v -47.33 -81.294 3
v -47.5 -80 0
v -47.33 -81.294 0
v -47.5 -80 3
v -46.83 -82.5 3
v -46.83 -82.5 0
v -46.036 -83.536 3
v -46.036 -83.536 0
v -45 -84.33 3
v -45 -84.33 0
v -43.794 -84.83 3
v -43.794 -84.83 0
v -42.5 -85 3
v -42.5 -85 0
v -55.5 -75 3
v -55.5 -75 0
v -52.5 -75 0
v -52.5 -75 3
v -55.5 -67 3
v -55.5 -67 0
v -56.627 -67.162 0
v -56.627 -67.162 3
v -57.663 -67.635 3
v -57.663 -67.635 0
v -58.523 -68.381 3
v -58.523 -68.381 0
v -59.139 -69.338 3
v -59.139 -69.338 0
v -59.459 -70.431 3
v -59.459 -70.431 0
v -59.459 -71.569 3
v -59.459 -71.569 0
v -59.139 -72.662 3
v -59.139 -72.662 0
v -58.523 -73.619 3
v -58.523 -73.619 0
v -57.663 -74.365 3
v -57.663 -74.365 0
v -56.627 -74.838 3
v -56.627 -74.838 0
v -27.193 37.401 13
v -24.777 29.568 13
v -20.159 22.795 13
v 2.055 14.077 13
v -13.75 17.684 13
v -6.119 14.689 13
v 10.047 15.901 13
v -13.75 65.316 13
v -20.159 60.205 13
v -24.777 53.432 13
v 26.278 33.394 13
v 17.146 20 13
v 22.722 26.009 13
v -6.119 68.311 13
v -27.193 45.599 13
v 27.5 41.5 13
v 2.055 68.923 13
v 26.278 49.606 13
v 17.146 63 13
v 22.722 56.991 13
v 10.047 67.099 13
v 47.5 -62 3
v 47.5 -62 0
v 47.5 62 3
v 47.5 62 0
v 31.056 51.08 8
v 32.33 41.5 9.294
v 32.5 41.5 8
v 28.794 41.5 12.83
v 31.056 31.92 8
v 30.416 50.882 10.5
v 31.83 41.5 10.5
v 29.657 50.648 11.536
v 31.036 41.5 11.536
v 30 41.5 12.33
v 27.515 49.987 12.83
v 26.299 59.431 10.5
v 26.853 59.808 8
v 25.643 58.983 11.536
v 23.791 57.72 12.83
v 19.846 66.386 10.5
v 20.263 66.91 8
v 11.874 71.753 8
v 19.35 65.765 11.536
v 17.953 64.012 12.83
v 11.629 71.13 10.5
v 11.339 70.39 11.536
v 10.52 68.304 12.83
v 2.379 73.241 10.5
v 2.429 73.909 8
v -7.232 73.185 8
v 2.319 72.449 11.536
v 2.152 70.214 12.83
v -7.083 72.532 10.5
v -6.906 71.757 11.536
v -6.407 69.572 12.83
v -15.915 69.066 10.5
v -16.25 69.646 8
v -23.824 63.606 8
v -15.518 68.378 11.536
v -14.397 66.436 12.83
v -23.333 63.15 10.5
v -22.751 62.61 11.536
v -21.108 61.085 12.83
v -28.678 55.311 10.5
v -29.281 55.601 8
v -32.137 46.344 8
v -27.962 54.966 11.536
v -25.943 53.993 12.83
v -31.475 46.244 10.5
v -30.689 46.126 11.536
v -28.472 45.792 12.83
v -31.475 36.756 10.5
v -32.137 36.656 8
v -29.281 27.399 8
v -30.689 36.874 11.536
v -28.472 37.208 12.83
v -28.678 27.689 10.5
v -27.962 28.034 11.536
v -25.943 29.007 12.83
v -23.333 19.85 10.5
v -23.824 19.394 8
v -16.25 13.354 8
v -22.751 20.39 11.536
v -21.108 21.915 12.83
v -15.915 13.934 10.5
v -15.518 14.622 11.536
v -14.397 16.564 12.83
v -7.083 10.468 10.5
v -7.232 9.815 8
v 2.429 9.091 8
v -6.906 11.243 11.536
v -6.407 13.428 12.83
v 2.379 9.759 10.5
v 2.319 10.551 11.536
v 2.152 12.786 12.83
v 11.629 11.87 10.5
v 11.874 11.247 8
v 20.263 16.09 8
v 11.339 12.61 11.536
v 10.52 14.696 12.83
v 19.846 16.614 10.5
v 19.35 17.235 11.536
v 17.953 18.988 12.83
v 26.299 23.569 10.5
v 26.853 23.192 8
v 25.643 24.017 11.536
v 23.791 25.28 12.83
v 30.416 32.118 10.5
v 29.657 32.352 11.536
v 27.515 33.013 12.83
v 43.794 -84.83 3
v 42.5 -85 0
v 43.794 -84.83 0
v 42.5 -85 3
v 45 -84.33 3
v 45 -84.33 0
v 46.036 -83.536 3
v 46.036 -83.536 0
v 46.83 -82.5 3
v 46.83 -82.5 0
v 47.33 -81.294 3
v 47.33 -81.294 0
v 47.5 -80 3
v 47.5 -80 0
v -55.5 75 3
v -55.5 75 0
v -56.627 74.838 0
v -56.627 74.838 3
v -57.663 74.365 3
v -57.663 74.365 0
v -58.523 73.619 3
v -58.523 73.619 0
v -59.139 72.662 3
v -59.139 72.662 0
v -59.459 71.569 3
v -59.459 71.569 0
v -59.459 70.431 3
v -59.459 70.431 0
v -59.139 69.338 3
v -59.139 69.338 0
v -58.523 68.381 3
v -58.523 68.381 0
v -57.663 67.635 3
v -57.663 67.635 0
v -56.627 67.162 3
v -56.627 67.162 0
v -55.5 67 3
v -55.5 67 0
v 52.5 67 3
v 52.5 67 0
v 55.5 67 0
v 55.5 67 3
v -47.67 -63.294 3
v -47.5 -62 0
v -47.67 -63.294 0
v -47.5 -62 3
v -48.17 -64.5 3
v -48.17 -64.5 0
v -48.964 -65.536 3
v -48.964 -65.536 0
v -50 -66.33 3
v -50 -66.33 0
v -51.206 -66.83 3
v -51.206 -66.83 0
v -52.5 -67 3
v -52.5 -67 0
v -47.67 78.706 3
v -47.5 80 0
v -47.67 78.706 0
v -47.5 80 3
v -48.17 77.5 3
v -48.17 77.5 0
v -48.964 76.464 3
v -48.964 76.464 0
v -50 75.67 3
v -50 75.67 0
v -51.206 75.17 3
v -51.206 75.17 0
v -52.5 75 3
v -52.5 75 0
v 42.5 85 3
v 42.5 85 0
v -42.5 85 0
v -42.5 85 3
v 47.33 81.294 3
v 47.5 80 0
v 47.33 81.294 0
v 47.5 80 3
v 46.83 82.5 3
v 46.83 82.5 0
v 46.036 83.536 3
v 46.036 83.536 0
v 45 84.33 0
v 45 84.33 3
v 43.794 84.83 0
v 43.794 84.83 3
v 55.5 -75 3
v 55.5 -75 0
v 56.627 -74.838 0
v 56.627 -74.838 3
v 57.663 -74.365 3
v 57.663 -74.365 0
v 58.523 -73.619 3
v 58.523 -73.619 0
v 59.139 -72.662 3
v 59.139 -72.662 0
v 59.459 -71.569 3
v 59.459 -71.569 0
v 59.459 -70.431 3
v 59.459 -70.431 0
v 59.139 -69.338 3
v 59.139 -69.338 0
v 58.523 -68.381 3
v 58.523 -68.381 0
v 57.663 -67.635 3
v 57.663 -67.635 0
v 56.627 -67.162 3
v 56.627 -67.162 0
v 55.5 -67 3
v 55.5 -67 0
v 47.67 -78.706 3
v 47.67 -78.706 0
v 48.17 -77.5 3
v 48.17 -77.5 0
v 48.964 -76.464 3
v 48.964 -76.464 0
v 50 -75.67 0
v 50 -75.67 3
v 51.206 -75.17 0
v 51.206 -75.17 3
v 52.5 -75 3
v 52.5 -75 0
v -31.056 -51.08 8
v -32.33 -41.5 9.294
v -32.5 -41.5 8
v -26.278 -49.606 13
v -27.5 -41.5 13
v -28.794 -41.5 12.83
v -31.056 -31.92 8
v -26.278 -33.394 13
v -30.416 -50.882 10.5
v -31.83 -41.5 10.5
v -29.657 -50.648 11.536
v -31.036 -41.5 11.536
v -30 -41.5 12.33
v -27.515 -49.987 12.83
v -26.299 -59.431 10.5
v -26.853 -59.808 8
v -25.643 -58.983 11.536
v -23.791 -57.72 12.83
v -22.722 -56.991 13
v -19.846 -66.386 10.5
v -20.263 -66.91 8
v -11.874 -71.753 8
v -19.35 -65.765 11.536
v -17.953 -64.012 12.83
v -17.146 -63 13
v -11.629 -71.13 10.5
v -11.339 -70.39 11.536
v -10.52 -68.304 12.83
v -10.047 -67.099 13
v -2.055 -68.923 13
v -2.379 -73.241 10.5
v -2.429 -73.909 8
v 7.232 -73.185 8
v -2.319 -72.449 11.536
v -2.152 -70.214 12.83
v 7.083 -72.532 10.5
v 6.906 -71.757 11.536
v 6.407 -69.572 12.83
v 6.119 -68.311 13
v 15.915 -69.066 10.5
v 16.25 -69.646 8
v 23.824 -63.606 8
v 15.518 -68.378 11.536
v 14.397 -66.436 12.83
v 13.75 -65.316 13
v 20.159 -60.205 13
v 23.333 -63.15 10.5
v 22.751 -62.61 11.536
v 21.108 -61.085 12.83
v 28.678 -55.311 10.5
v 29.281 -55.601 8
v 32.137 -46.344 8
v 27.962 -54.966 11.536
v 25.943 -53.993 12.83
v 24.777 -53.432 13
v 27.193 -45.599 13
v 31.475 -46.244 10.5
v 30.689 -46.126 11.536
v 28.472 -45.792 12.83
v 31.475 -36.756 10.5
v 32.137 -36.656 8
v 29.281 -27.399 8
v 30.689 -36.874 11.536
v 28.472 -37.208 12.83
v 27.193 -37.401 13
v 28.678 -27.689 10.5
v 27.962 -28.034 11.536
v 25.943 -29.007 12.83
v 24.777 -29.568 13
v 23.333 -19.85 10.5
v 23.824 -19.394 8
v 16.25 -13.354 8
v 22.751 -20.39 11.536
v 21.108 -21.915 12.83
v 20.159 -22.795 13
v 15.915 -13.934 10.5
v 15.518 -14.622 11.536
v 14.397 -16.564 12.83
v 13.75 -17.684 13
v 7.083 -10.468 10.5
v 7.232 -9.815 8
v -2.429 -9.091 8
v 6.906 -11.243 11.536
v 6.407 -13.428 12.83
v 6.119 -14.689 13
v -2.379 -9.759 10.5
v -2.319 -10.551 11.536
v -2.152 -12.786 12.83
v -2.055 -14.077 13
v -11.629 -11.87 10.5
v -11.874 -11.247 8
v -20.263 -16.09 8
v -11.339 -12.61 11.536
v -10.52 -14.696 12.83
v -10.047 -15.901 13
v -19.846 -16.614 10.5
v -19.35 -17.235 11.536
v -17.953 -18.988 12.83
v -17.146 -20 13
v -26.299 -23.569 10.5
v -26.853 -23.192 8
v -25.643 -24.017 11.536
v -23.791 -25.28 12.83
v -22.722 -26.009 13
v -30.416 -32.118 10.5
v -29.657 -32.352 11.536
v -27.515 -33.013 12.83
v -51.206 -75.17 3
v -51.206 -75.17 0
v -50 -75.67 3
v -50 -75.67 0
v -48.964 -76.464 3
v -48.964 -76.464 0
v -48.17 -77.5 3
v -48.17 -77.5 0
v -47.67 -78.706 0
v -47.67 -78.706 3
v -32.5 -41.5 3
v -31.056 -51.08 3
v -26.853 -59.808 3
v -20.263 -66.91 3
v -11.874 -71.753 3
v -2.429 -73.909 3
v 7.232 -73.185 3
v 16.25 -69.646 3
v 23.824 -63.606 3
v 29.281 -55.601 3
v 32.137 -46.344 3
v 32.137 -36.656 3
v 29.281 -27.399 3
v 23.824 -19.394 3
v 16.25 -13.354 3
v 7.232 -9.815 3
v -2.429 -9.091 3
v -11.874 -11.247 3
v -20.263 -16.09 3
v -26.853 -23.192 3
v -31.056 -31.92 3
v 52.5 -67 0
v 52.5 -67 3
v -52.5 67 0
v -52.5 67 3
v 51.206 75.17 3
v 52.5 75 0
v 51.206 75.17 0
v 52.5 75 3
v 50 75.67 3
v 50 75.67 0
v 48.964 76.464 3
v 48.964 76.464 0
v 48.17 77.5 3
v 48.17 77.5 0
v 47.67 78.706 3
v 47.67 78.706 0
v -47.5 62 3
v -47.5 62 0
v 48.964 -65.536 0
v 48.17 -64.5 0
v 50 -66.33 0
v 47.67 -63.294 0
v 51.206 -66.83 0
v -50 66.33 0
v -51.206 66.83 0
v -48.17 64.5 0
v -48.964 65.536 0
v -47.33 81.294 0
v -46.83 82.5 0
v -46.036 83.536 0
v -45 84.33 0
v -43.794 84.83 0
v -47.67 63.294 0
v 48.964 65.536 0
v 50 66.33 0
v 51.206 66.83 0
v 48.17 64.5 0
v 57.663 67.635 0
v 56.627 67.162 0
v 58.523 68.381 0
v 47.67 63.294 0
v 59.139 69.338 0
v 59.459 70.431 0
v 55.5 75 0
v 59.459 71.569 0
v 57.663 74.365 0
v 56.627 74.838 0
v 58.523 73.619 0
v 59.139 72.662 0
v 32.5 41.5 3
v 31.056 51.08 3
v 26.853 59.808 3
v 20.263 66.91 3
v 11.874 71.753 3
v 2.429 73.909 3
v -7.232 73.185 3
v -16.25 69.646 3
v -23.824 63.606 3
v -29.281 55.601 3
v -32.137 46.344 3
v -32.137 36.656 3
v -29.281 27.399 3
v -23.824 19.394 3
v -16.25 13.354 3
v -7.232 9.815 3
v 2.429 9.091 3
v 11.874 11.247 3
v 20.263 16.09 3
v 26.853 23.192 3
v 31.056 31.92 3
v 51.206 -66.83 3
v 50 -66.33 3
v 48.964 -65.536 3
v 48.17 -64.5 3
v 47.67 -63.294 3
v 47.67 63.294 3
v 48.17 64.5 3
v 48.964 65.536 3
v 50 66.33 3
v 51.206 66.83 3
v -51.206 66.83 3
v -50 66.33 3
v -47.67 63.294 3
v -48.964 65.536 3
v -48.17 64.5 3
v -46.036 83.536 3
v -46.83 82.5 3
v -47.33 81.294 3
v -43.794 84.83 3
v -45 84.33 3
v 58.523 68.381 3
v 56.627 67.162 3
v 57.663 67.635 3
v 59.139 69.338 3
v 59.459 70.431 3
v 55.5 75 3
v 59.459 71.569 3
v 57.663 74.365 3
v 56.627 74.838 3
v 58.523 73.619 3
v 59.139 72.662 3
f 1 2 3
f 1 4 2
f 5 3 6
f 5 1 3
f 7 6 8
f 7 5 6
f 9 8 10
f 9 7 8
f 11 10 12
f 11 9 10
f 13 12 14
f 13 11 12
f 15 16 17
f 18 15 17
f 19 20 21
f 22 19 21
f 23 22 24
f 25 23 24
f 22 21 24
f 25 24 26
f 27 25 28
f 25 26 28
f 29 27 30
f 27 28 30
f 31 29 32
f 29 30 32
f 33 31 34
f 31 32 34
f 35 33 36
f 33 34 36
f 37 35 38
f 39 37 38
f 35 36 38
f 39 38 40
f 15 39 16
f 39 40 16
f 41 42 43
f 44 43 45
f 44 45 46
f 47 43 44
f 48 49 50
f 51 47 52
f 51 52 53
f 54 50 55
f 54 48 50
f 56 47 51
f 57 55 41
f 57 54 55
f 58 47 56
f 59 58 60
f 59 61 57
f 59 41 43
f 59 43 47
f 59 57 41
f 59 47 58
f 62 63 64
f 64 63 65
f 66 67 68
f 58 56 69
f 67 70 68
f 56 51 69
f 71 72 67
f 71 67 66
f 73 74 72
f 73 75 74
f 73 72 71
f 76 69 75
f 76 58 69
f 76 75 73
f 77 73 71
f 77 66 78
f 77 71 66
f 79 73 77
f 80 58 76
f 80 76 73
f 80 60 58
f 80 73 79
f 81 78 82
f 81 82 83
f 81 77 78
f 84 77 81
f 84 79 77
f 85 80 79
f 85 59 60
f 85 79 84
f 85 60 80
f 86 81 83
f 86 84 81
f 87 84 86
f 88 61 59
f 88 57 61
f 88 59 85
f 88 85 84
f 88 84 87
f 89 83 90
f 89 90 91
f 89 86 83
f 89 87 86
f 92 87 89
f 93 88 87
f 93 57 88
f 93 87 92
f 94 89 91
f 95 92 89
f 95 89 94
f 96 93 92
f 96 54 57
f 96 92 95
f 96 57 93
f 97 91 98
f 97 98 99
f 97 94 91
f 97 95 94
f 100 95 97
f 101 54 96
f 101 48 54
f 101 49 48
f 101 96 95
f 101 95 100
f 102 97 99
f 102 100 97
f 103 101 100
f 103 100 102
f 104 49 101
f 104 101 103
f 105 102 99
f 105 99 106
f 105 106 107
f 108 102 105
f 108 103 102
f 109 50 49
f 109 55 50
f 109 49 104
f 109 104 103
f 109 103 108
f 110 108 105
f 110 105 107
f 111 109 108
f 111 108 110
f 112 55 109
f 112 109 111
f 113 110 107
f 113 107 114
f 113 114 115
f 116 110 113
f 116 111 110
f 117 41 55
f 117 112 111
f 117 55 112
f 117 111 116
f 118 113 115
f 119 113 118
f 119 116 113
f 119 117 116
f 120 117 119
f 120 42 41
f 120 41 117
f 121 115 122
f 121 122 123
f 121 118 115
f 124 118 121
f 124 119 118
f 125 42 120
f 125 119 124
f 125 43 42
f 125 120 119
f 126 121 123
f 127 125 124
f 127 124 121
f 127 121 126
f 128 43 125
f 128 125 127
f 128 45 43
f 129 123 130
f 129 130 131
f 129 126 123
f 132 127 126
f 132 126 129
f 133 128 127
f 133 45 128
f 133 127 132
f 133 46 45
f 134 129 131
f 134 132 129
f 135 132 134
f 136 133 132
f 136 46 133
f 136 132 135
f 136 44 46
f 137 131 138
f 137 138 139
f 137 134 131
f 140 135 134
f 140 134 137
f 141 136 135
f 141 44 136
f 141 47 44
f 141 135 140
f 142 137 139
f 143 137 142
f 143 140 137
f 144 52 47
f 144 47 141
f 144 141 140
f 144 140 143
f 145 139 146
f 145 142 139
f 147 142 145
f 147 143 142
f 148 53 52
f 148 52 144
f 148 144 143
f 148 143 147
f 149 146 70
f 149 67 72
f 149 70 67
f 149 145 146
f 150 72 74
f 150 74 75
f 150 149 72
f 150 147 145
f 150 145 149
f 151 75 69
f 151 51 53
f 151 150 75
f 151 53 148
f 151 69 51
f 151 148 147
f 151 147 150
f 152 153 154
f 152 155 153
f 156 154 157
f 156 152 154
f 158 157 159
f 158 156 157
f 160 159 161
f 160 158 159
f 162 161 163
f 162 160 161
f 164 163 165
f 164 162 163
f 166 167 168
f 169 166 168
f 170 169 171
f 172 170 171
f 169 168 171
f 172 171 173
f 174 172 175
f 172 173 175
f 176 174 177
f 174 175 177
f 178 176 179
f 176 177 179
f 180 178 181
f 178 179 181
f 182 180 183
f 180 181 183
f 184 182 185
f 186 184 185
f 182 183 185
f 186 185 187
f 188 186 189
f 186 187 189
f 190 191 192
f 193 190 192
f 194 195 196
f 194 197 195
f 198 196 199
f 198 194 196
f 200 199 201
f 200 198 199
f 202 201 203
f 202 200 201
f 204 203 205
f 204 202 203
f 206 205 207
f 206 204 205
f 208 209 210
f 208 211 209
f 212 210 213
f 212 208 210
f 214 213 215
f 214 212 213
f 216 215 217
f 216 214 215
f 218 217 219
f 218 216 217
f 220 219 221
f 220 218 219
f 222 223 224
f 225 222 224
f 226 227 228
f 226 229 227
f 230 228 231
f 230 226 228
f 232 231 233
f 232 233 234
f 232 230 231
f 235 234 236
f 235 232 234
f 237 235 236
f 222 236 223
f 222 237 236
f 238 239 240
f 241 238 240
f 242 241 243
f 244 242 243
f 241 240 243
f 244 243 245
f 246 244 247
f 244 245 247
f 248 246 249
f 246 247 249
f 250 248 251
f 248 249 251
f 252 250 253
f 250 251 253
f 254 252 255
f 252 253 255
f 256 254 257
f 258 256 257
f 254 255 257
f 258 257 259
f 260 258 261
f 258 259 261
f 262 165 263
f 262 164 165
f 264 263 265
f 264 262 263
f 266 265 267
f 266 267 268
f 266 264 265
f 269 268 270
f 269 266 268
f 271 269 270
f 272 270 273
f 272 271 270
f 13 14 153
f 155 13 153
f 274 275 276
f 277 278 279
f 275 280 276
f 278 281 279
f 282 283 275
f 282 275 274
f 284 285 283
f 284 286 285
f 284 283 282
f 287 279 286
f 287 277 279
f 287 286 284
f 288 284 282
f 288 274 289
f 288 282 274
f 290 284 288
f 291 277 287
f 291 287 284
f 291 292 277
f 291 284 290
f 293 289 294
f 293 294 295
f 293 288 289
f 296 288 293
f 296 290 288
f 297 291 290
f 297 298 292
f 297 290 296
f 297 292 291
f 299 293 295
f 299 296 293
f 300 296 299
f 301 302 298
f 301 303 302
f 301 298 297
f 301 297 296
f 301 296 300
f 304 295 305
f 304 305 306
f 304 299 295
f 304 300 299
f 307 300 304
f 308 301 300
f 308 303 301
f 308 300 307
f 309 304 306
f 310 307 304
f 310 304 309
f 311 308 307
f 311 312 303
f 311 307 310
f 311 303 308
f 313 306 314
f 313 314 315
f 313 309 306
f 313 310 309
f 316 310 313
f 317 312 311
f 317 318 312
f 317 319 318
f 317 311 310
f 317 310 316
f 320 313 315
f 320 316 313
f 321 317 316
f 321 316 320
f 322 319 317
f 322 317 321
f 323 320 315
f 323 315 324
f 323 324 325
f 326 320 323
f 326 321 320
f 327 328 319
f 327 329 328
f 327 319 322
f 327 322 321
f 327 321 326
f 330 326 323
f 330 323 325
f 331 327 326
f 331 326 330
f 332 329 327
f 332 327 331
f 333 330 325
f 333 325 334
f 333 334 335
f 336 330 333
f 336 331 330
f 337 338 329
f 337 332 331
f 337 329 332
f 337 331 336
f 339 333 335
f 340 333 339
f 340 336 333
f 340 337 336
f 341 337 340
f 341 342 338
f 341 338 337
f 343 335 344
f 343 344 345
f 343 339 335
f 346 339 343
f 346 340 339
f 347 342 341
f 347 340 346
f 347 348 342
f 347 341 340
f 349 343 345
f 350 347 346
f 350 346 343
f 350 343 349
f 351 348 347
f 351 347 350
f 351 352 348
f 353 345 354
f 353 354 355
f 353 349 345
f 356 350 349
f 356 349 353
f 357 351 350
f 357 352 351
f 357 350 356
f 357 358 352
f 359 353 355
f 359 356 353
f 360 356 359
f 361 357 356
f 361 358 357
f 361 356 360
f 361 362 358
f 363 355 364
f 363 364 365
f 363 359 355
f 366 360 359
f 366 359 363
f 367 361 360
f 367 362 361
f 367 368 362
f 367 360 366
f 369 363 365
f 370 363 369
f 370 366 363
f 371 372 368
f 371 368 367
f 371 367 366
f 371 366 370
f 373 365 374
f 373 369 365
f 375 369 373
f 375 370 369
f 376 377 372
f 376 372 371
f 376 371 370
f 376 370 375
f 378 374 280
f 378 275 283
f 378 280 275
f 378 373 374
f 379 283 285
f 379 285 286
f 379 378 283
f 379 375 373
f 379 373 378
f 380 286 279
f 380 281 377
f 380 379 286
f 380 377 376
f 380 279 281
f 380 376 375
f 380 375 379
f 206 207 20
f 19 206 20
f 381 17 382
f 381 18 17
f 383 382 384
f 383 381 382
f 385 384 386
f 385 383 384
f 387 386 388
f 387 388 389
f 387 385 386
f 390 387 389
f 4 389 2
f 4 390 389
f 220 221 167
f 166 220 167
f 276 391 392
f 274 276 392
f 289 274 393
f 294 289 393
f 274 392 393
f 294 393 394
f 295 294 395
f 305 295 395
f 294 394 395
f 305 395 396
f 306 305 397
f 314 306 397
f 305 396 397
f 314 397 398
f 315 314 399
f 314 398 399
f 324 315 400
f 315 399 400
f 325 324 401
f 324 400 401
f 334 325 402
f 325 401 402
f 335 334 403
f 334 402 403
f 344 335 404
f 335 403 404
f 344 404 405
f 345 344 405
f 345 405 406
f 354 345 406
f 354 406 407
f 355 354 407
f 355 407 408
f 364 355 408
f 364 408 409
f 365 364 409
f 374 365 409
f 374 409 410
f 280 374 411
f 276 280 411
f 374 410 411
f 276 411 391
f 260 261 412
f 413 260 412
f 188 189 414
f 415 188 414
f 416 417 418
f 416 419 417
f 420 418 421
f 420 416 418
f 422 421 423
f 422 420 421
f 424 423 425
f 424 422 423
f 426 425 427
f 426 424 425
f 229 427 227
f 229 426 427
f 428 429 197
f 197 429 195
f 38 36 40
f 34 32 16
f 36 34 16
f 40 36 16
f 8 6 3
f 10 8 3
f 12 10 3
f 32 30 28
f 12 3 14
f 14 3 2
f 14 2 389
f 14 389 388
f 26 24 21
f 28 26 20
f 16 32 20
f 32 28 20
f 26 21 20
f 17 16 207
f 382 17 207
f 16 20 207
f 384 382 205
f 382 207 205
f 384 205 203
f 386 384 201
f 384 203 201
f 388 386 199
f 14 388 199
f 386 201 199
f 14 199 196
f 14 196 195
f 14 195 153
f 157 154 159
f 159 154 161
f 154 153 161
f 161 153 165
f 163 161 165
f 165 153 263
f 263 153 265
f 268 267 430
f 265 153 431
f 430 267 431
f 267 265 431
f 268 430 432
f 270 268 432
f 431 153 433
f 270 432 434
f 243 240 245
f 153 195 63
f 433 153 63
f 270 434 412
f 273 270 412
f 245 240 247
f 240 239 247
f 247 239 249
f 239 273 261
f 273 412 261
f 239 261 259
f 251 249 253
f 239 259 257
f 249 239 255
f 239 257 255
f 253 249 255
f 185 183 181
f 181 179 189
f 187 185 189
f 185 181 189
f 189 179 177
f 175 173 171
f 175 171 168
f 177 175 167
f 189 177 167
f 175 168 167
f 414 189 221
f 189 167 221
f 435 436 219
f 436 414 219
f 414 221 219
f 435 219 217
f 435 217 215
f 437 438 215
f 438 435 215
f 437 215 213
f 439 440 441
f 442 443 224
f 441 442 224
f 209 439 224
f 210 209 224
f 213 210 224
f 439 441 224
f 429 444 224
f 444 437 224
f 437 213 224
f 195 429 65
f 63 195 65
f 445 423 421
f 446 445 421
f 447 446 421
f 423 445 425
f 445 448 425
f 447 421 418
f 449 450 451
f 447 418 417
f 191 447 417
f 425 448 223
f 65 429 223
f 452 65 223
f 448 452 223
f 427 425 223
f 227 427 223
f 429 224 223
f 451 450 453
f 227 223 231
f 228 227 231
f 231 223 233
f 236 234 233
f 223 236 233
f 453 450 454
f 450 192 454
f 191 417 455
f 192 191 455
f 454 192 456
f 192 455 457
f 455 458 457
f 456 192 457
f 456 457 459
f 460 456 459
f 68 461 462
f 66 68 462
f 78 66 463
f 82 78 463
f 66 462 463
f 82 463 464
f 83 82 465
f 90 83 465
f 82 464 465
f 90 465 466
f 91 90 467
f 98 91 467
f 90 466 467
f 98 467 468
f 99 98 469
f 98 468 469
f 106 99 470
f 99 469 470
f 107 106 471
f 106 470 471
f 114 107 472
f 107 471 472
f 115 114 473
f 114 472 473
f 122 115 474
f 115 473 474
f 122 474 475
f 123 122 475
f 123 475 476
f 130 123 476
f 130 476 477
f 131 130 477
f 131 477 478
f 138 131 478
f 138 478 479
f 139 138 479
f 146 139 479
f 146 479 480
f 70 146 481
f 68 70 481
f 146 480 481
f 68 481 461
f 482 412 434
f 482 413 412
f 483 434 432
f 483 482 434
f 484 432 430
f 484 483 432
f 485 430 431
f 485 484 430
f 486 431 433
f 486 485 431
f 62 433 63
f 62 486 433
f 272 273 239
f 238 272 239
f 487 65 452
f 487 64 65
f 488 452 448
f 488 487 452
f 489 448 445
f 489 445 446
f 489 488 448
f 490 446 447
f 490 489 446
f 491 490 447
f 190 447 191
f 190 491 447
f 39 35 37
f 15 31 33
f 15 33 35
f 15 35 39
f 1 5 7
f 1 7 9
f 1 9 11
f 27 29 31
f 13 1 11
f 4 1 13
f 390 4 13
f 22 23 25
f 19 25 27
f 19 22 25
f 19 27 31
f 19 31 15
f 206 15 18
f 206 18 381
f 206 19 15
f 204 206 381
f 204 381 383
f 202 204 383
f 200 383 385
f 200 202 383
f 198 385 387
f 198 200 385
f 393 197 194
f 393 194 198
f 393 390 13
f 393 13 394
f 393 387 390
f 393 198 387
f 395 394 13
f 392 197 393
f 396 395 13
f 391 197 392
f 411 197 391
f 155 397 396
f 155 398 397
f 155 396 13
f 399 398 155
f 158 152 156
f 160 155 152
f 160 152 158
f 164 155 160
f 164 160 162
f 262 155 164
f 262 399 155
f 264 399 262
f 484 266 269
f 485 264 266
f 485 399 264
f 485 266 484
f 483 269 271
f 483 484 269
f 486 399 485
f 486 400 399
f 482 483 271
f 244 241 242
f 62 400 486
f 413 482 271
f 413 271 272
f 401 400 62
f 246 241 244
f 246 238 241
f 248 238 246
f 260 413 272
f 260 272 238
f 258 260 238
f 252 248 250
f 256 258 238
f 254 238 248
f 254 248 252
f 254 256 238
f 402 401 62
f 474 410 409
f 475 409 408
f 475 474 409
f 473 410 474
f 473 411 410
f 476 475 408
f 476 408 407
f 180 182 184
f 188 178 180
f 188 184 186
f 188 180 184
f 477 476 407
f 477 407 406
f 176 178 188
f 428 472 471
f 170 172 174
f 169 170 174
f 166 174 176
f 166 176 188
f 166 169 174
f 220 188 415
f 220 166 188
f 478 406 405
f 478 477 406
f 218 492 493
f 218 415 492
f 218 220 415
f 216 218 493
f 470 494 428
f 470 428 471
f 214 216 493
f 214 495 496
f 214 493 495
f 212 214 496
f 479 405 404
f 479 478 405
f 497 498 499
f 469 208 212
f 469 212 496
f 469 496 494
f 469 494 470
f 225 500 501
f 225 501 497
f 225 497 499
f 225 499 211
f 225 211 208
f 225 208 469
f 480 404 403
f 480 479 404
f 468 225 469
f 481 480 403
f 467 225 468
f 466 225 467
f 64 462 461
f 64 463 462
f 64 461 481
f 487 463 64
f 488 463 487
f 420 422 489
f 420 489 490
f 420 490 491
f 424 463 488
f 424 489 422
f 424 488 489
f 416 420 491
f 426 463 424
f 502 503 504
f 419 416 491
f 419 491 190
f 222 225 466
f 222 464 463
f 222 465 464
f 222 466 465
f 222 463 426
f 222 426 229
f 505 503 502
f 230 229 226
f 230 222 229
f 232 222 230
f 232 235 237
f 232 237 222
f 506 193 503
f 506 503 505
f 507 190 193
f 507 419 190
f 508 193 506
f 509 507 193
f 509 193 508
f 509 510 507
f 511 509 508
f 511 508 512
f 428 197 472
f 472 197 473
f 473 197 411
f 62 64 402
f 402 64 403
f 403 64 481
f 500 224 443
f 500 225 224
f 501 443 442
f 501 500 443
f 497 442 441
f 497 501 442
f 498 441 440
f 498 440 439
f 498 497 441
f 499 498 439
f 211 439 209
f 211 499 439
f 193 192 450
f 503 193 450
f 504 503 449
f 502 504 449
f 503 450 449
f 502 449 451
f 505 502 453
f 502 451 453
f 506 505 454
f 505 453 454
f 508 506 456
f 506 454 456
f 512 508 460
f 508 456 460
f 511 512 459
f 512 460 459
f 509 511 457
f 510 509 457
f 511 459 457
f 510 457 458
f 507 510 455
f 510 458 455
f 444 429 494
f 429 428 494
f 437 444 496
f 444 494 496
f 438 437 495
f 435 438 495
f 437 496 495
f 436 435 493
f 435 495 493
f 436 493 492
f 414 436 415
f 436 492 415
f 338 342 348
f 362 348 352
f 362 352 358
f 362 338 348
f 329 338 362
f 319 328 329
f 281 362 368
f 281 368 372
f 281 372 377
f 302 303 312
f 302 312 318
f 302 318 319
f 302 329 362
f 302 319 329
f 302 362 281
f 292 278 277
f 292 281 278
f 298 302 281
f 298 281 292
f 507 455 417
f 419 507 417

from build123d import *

# Parameters (mm, degrees)
EXTRUDE_1_DEPTH = 3
FILLET_1_R      = 5
SKETCH_2_R      = 32.5
EXTRUDE_2_DEPTH = 10
FILLET_2_R      = 5


with BuildPart() as part:
    # 草圖1 → 填料-伸長1 (new body)
    with BuildSketch(Plane.XY):
        with BuildLine():
            Line((-47.5, 67), (-47.5, -67))
            Line((-47.5, -67), (-55.5, -67))
            ThreePointArc((-55.5, -67), (-59.5, -71), (-55.5, -75))
            Line((-55.5, -75), (-47.5, -75))
            Line((-47.5, -75), (-47.5, -85))
            Line((-47.5, -85), (47.5, -85))
            Line((47.5, -85), (47.5, -75))
            Line((47.5, -75), (55.5, -75))
            ThreePointArc((55.5, -75), (59.5, -71), (55.5, -67))
            Line((55.5, -67), (47.5, -67))
            Line((47.5, -67), (47.5, 67))
            Line((47.5, 67), (55.5, 67))
            ThreePointArc((55.5, 67), (59.5, 71), (55.5, 75))
            Line((55.5, 75), (47.5, 75))
            Line((47.5, 75), (47.5, 85))
            Line((47.5, 85), (-47.5, 85))
            Line((-47.5, 85), (-47.5, 75))
            Line((-47.5, 75), (-55.5, 75))
            ThreePointArc((-55.5, 75), (-59.5, 71), (-55.5, 67))
            Line((-55.5, 67), (-47.5, 67))
        make_face()
    extrude(amount=EXTRUDE_1_DEPTH)

    # 圓角1
    fillet_1_edges = [part.edges().sort_by_distance(p)[0] for p in [
        (-47.5, 85, 1.5),
        (47.5, 85, 1.5),
        (47.5, 75, 1.5),
        (47.5, 67, 1.5),
        (47.5, -67, 1.5),
        (47.5, -75, 1.5),
        (47.5, -85, 1.5),
        (-47.5, -85, 1.5),
        (-47.5, -75, 1.5),
        (-47.5, -67, 1.5),
        (-47.5, 67, 1.5),
        (-47.5, 75, 1.5),
    ]]
    fillet(fillet_1_edges, radius=FILLET_1_R - 0.0001)  # a hair under: the kernel refuses the full size

    # 草圖2 → 填料-伸長2 (add)
    with BuildSketch(Plane.XY.offset(3)):
        with Locations((0, 41.5)):
            Circle(SKETCH_2_R)
        with Locations(Location((0, -41.5, 0), (0, 0, 180))):
            Circle(SKETCH_2_R)
    extrude(amount=EXTRUDE_2_DEPTH)

    # 圓角2
    fillet_2_edges = [part.edges().sort_by_distance(p)[0] for p in [
        (-32.5, 41.5, 13),
        (32.5, -41.5, 13),
    ]]
    fillet(fillet_2_edges, radius=FILLET_2_R)


solid = part.part
